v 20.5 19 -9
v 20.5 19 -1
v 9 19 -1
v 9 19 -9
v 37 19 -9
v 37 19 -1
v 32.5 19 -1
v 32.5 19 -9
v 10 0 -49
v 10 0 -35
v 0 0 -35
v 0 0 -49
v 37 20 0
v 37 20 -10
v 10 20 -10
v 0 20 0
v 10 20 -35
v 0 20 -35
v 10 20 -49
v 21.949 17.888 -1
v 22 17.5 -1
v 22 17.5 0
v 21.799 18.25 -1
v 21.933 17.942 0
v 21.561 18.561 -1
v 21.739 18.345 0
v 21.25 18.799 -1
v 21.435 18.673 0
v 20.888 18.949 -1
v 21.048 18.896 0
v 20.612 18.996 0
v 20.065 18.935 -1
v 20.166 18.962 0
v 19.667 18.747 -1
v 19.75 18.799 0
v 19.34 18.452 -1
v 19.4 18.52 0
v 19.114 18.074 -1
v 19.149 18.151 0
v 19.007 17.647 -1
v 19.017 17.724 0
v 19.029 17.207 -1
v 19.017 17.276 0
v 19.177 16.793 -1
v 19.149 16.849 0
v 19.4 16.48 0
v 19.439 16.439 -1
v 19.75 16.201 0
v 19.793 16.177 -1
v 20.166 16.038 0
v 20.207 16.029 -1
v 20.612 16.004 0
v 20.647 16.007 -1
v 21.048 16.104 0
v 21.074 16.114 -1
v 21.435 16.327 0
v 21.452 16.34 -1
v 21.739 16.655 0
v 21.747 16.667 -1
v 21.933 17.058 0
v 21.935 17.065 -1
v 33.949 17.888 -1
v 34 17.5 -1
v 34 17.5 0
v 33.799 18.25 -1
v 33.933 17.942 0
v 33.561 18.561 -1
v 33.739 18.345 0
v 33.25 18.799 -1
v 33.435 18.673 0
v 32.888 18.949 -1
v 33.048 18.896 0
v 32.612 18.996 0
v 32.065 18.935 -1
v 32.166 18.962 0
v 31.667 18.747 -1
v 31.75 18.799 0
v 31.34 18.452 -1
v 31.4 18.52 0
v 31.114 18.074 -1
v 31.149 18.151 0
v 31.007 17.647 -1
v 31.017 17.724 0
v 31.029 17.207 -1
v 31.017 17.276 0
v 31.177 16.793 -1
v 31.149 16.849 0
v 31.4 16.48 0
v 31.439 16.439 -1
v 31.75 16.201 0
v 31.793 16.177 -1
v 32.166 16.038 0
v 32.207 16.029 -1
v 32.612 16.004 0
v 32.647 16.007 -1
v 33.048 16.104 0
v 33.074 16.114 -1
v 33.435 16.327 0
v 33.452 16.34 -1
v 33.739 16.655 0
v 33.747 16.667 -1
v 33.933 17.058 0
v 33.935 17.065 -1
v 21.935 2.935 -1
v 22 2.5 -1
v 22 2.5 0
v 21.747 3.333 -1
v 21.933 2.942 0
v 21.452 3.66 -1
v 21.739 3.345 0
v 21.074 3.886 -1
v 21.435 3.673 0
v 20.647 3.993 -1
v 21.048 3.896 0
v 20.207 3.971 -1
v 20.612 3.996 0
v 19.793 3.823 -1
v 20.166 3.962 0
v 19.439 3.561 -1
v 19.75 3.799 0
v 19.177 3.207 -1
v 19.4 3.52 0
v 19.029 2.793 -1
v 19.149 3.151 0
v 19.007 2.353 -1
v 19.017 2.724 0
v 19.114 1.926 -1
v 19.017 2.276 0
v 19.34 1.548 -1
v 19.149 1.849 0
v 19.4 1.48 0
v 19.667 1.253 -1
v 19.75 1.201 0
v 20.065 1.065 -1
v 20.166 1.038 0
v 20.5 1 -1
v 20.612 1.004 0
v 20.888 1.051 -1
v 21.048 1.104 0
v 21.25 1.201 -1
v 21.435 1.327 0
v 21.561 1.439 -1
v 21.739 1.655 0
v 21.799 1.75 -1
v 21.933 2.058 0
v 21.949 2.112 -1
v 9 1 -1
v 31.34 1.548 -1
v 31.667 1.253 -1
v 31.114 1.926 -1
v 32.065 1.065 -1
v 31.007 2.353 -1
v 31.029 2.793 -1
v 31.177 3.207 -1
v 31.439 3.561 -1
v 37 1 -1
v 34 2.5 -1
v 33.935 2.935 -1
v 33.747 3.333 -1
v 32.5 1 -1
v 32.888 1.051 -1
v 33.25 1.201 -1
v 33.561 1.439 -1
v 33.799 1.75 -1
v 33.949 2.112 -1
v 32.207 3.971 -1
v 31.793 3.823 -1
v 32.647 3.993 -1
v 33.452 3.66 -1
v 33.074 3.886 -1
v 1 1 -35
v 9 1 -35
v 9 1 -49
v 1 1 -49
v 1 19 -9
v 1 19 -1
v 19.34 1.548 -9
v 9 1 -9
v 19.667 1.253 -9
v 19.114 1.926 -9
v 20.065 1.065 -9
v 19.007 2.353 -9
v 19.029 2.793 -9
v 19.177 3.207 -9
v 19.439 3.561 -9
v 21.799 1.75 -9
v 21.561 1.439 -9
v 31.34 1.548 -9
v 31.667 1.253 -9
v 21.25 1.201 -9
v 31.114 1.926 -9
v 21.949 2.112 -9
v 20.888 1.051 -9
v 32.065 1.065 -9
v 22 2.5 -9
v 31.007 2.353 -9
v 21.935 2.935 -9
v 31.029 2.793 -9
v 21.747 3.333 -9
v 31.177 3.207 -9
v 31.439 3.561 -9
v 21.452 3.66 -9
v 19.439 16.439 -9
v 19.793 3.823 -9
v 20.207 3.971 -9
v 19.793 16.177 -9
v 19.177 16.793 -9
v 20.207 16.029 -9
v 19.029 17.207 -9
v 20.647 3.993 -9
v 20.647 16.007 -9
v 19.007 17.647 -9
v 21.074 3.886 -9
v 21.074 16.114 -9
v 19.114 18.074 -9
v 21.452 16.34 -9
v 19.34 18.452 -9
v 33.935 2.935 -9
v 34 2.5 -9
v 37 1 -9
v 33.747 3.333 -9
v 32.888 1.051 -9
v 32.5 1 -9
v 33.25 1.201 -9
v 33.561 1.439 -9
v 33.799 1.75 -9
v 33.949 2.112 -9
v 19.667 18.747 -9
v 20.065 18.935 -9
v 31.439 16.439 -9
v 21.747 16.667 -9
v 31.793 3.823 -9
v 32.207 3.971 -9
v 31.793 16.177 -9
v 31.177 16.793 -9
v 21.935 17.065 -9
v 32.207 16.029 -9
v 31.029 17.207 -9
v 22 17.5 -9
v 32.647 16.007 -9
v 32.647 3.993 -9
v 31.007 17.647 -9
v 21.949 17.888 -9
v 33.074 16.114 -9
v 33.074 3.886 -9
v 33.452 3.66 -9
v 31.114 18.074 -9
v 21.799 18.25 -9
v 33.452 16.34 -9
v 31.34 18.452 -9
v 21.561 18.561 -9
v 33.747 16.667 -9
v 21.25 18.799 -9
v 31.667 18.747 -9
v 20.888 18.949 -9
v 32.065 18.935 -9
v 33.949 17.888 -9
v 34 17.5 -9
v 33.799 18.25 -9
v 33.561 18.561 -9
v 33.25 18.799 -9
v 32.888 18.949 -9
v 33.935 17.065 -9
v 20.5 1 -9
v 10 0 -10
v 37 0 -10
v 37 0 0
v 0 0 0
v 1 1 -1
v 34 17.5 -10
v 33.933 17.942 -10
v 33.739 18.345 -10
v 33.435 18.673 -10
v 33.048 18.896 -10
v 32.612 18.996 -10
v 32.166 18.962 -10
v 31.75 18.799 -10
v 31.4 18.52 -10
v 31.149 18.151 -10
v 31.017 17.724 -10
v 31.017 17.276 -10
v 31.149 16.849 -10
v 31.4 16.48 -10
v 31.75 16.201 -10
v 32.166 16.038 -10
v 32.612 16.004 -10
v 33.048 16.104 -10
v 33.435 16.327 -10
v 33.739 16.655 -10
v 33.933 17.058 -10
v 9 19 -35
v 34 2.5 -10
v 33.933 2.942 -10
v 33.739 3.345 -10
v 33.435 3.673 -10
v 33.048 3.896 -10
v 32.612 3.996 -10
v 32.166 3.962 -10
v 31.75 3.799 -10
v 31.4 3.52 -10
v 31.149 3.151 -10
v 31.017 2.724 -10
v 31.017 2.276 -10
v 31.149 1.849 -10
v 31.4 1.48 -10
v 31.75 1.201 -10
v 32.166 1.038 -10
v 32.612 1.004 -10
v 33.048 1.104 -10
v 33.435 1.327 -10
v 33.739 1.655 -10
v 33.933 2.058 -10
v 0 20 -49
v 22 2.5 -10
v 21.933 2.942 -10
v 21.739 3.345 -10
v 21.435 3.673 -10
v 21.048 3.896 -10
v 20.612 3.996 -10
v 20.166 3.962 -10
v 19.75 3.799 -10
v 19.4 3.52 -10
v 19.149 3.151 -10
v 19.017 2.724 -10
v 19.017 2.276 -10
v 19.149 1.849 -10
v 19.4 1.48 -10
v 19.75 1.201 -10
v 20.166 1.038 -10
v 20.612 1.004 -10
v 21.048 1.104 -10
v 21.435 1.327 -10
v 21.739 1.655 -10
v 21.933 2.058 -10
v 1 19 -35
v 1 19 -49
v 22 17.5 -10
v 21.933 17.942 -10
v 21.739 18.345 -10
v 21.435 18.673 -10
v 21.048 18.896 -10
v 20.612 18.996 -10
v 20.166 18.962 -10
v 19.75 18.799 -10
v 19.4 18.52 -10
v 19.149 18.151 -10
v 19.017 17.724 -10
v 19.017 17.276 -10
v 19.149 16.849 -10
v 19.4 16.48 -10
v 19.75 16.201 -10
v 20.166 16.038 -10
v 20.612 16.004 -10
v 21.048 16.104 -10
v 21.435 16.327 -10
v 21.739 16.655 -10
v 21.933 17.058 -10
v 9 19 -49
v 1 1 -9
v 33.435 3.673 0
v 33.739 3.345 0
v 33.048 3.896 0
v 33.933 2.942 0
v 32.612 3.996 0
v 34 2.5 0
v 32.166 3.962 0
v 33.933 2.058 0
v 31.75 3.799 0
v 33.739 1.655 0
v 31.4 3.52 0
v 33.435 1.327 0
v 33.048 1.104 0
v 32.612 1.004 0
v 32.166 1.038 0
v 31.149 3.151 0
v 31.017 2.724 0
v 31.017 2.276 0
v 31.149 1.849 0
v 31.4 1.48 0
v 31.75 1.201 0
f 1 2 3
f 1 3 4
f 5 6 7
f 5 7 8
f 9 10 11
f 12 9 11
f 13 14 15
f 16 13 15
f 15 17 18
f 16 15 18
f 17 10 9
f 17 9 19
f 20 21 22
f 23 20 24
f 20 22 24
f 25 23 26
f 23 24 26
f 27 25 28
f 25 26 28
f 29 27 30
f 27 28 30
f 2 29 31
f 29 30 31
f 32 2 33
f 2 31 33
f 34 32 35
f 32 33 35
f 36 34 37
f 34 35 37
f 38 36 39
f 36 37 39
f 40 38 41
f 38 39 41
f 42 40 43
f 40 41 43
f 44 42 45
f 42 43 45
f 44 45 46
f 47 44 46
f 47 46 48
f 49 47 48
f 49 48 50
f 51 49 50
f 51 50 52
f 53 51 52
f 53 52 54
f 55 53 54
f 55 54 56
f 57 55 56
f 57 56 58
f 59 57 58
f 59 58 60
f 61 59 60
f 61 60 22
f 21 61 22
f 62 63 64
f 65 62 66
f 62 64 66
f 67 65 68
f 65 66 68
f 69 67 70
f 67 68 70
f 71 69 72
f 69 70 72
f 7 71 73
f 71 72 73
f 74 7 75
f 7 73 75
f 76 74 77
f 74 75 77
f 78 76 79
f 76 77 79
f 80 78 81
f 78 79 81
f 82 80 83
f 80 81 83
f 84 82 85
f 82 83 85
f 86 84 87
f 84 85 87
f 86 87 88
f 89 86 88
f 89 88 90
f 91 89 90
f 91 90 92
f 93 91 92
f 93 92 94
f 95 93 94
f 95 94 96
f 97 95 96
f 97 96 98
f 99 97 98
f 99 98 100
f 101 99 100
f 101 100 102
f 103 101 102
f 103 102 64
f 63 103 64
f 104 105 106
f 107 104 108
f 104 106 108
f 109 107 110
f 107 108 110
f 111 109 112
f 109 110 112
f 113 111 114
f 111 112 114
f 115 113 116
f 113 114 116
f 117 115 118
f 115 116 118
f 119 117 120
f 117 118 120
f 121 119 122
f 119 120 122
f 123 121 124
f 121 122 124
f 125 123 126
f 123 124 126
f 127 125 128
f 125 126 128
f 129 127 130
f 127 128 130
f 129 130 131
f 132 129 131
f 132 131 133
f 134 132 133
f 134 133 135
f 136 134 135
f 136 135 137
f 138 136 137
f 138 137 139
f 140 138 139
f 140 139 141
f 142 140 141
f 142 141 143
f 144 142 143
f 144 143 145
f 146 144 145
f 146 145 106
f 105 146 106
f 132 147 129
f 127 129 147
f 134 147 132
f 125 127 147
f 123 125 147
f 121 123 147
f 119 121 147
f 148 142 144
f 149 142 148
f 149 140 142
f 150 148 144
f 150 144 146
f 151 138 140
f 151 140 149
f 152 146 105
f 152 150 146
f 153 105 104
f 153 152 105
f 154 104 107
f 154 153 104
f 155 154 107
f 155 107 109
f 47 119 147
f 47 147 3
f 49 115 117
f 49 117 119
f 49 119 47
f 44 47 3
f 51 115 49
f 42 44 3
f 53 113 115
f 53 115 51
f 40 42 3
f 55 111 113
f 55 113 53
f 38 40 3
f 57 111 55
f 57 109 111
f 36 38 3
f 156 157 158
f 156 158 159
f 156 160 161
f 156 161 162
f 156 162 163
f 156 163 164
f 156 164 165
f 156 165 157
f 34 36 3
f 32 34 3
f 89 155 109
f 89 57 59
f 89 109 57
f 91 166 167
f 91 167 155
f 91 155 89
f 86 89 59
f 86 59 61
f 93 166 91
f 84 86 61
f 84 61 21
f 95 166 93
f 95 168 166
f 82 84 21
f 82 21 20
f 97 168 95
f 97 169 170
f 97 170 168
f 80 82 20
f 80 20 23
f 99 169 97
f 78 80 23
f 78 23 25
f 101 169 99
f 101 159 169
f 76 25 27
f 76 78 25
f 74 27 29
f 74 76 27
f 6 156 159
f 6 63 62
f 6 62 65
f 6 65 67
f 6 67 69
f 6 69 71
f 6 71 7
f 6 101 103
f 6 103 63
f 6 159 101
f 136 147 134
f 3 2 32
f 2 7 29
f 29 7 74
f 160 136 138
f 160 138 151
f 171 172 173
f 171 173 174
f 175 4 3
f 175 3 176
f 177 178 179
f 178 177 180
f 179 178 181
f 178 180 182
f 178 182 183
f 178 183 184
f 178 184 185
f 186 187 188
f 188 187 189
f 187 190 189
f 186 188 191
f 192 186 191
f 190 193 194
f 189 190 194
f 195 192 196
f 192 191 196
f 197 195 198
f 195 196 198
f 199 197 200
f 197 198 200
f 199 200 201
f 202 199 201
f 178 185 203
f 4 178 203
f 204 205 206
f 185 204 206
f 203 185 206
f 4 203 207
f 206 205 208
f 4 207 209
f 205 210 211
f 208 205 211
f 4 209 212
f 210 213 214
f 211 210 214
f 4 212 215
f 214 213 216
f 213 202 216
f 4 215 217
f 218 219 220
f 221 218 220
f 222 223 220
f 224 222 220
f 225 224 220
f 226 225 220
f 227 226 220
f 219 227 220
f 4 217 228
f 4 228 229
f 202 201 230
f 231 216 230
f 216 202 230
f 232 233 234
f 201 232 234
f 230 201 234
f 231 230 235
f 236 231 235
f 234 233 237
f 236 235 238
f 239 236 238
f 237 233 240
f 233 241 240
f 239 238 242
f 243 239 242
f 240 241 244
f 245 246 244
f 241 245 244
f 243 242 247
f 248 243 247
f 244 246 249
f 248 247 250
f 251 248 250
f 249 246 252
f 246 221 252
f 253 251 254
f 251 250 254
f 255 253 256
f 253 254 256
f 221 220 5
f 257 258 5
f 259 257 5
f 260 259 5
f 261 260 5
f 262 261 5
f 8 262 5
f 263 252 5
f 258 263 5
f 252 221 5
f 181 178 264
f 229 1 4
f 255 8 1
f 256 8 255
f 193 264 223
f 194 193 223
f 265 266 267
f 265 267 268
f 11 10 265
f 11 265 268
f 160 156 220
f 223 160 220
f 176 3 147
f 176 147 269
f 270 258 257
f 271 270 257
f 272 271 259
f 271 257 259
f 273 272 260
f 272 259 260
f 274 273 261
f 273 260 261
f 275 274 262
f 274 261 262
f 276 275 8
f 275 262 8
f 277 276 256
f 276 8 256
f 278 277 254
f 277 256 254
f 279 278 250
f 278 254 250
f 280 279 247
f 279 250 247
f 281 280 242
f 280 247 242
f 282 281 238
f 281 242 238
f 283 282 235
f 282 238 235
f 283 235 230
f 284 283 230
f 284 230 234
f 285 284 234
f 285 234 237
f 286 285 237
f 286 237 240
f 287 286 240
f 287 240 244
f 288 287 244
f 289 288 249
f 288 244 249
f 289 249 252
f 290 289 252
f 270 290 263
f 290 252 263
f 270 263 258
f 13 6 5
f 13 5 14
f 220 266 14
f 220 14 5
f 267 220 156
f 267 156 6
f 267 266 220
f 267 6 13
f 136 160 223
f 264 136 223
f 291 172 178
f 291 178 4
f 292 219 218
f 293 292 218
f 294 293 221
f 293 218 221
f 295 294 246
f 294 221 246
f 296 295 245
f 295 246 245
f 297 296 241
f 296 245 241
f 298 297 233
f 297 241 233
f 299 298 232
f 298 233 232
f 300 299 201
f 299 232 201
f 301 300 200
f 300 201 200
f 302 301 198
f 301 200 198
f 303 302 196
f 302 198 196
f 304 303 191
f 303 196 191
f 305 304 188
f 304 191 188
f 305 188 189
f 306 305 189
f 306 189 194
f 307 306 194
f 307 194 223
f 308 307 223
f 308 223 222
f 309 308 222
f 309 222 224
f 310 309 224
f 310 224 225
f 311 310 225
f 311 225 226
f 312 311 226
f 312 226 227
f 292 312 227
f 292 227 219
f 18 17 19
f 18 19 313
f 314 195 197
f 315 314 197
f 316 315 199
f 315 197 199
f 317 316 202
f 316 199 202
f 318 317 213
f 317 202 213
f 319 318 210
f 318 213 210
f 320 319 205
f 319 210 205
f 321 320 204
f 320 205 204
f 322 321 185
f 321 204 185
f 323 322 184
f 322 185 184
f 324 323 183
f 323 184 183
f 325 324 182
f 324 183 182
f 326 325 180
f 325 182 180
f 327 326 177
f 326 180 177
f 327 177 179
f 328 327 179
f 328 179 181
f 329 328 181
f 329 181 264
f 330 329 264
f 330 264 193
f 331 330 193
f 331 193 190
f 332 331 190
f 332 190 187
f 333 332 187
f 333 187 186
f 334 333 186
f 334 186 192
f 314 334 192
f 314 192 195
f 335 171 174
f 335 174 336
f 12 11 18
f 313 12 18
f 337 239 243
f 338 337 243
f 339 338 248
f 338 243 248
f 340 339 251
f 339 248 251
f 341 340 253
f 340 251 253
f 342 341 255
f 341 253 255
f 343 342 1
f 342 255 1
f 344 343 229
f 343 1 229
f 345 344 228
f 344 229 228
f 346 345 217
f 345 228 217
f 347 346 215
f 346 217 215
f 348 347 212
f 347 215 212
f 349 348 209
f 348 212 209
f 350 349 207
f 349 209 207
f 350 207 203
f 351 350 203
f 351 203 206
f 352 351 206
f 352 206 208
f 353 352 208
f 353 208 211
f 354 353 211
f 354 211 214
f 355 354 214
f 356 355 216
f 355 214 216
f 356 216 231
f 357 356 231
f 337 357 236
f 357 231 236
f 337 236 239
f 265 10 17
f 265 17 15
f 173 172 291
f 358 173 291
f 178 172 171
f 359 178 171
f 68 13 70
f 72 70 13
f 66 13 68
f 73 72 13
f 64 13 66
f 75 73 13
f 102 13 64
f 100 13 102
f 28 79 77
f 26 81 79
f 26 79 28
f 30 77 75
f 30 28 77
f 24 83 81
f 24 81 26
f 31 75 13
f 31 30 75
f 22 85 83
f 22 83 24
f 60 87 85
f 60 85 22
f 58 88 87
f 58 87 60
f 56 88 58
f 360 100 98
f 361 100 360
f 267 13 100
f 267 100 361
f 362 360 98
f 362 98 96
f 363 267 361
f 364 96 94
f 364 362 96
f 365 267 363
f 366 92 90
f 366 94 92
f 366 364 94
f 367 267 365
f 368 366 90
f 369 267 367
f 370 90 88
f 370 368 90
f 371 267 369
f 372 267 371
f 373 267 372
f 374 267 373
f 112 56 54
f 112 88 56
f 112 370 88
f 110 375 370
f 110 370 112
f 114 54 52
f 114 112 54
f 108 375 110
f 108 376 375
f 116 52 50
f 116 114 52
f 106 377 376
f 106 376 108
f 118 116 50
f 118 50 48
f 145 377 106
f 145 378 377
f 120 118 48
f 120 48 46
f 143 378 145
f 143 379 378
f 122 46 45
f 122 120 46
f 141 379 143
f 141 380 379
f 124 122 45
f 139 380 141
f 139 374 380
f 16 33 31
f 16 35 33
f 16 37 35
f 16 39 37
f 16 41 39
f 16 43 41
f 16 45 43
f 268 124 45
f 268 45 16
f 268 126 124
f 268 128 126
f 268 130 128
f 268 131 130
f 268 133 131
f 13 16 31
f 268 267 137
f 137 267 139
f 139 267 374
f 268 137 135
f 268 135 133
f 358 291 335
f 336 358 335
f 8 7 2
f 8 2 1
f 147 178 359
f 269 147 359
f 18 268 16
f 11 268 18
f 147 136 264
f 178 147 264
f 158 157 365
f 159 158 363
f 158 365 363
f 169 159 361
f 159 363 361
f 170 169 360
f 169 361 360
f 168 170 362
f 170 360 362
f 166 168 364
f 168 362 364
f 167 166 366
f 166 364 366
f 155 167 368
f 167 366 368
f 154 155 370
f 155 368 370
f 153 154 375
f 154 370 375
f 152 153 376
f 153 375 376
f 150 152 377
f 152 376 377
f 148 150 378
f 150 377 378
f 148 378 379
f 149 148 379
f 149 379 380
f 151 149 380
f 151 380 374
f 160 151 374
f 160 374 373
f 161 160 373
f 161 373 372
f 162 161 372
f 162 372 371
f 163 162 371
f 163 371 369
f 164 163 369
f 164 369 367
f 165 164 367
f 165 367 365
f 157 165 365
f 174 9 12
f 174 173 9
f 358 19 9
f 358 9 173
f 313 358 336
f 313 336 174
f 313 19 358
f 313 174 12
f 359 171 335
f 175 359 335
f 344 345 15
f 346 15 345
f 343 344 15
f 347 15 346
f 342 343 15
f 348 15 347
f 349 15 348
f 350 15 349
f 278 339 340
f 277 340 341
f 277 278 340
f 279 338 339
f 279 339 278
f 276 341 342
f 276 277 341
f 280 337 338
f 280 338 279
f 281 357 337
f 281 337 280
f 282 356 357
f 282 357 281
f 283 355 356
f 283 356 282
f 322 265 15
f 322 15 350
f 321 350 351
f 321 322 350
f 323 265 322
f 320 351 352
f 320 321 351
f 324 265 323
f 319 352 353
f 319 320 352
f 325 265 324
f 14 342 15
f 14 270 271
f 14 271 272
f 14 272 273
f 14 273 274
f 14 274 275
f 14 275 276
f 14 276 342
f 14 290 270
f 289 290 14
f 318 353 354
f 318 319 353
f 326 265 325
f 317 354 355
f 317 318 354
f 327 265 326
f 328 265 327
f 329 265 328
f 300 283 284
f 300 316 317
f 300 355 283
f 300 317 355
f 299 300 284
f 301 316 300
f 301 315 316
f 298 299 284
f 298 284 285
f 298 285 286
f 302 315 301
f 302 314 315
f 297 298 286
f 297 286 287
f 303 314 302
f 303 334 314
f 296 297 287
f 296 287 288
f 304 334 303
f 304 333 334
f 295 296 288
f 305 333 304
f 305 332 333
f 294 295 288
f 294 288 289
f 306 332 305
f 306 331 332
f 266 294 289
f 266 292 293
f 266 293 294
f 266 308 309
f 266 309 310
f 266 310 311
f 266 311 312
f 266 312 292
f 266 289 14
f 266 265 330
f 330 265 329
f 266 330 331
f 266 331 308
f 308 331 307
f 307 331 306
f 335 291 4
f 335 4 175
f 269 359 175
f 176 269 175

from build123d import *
from build123d.topology import SkipClean

# Parameters (mm, degrees)
EXTRUDE_1_DEPTH     = 20
MM_PRESS_1_D        = 3
SKETCH_4_W          = 8
SKETCH_4_H          = 18
CUT_EXTRUDE_1_DEPTH = 34
SKETCH_5_W          = 8
SKETCH_5_H          = 18
CUT_EXTRUDE_3_DEPTH = 36
SKETCH_7_W          = 10
SKETCH_7_H          = 20
SKETCH_7_W_2        = 8
SKETCH_7_H_2        = 18
EXTRUDE_2_DEPTH     = 14


with BuildPart() as part:
    # 草图1 → 凸台-拉伸1 (new body)
    with BuildSketch(Plane(origin=(0, 0, 0), x_dir=(1, 0, 0), z_dir=(0, 1, 0))):
        Polygon((0, 0), (0, 35), (10, 35), (10, 10), (37, 10), (37, 0), align=None)
    extrude(amount=EXTRUDE_1_DEPTH)

    # 大小mm Press 暗销孔1 (through all)
    with Locations(Plane(origin=(20.5, 2.5, -10), x_dir=(-1, 0, 0), z_dir=(0, 0, -1))):
        with Locations((0, 0), (-12, 0), (-12, 15), (0, 15)):
            Hole(MM_PRESS_1_D / 2)

    # 草图4 → 切除-拉伸1 (cut)
    with BuildSketch(Plane(origin=(0, 0, -35), x_dir=(-1, 0, 0), z_dir=(0, 0, -1))):
        with Locations((-5, 10)):
            Rectangle(SKETCH_4_W, SKETCH_4_H)
    extrude(amount=-CUT_EXTRUDE_1_DEPTH, mode=Mode.SUBTRACT)

    # 草图5 → 切除-拉伸3 (cut)
    with SkipClean():  # the faces are left unmerged after this step: merging them gives an invalid solid
        with BuildSketch(Plane(origin=(37, 0, 0), x_dir=(0, 0, -1), z_dir=(1, 0, 0))):
            with Locations((5, 10)):
                Rectangle(SKETCH_5_W, SKETCH_5_H)
        extrude(amount=-CUT_EXTRUDE_3_DEPTH, mode=Mode.SUBTRACT)

    # 草图7 → 凸台-拉伸2 (add)
    with SkipClean():  # the faces are left unmerged after this step: merging them gives an invalid solid
        with BuildSketch(Plane(origin=(0, 0, -35), x_dir=(-1, 0, 0), z_dir=(0, 0, -1))):
            with Locations((-5, 10)):
                Rectangle(SKETCH_7_W, SKETCH_7_H)
            with Locations((-5, 10)):
                Rectangle(SKETCH_7_W_2, SKETCH_7_H_2, mode=Mode.SUBTRACT)
        extrude(amount=EXTRUDE_2_DEPTH)


solid = part.part
